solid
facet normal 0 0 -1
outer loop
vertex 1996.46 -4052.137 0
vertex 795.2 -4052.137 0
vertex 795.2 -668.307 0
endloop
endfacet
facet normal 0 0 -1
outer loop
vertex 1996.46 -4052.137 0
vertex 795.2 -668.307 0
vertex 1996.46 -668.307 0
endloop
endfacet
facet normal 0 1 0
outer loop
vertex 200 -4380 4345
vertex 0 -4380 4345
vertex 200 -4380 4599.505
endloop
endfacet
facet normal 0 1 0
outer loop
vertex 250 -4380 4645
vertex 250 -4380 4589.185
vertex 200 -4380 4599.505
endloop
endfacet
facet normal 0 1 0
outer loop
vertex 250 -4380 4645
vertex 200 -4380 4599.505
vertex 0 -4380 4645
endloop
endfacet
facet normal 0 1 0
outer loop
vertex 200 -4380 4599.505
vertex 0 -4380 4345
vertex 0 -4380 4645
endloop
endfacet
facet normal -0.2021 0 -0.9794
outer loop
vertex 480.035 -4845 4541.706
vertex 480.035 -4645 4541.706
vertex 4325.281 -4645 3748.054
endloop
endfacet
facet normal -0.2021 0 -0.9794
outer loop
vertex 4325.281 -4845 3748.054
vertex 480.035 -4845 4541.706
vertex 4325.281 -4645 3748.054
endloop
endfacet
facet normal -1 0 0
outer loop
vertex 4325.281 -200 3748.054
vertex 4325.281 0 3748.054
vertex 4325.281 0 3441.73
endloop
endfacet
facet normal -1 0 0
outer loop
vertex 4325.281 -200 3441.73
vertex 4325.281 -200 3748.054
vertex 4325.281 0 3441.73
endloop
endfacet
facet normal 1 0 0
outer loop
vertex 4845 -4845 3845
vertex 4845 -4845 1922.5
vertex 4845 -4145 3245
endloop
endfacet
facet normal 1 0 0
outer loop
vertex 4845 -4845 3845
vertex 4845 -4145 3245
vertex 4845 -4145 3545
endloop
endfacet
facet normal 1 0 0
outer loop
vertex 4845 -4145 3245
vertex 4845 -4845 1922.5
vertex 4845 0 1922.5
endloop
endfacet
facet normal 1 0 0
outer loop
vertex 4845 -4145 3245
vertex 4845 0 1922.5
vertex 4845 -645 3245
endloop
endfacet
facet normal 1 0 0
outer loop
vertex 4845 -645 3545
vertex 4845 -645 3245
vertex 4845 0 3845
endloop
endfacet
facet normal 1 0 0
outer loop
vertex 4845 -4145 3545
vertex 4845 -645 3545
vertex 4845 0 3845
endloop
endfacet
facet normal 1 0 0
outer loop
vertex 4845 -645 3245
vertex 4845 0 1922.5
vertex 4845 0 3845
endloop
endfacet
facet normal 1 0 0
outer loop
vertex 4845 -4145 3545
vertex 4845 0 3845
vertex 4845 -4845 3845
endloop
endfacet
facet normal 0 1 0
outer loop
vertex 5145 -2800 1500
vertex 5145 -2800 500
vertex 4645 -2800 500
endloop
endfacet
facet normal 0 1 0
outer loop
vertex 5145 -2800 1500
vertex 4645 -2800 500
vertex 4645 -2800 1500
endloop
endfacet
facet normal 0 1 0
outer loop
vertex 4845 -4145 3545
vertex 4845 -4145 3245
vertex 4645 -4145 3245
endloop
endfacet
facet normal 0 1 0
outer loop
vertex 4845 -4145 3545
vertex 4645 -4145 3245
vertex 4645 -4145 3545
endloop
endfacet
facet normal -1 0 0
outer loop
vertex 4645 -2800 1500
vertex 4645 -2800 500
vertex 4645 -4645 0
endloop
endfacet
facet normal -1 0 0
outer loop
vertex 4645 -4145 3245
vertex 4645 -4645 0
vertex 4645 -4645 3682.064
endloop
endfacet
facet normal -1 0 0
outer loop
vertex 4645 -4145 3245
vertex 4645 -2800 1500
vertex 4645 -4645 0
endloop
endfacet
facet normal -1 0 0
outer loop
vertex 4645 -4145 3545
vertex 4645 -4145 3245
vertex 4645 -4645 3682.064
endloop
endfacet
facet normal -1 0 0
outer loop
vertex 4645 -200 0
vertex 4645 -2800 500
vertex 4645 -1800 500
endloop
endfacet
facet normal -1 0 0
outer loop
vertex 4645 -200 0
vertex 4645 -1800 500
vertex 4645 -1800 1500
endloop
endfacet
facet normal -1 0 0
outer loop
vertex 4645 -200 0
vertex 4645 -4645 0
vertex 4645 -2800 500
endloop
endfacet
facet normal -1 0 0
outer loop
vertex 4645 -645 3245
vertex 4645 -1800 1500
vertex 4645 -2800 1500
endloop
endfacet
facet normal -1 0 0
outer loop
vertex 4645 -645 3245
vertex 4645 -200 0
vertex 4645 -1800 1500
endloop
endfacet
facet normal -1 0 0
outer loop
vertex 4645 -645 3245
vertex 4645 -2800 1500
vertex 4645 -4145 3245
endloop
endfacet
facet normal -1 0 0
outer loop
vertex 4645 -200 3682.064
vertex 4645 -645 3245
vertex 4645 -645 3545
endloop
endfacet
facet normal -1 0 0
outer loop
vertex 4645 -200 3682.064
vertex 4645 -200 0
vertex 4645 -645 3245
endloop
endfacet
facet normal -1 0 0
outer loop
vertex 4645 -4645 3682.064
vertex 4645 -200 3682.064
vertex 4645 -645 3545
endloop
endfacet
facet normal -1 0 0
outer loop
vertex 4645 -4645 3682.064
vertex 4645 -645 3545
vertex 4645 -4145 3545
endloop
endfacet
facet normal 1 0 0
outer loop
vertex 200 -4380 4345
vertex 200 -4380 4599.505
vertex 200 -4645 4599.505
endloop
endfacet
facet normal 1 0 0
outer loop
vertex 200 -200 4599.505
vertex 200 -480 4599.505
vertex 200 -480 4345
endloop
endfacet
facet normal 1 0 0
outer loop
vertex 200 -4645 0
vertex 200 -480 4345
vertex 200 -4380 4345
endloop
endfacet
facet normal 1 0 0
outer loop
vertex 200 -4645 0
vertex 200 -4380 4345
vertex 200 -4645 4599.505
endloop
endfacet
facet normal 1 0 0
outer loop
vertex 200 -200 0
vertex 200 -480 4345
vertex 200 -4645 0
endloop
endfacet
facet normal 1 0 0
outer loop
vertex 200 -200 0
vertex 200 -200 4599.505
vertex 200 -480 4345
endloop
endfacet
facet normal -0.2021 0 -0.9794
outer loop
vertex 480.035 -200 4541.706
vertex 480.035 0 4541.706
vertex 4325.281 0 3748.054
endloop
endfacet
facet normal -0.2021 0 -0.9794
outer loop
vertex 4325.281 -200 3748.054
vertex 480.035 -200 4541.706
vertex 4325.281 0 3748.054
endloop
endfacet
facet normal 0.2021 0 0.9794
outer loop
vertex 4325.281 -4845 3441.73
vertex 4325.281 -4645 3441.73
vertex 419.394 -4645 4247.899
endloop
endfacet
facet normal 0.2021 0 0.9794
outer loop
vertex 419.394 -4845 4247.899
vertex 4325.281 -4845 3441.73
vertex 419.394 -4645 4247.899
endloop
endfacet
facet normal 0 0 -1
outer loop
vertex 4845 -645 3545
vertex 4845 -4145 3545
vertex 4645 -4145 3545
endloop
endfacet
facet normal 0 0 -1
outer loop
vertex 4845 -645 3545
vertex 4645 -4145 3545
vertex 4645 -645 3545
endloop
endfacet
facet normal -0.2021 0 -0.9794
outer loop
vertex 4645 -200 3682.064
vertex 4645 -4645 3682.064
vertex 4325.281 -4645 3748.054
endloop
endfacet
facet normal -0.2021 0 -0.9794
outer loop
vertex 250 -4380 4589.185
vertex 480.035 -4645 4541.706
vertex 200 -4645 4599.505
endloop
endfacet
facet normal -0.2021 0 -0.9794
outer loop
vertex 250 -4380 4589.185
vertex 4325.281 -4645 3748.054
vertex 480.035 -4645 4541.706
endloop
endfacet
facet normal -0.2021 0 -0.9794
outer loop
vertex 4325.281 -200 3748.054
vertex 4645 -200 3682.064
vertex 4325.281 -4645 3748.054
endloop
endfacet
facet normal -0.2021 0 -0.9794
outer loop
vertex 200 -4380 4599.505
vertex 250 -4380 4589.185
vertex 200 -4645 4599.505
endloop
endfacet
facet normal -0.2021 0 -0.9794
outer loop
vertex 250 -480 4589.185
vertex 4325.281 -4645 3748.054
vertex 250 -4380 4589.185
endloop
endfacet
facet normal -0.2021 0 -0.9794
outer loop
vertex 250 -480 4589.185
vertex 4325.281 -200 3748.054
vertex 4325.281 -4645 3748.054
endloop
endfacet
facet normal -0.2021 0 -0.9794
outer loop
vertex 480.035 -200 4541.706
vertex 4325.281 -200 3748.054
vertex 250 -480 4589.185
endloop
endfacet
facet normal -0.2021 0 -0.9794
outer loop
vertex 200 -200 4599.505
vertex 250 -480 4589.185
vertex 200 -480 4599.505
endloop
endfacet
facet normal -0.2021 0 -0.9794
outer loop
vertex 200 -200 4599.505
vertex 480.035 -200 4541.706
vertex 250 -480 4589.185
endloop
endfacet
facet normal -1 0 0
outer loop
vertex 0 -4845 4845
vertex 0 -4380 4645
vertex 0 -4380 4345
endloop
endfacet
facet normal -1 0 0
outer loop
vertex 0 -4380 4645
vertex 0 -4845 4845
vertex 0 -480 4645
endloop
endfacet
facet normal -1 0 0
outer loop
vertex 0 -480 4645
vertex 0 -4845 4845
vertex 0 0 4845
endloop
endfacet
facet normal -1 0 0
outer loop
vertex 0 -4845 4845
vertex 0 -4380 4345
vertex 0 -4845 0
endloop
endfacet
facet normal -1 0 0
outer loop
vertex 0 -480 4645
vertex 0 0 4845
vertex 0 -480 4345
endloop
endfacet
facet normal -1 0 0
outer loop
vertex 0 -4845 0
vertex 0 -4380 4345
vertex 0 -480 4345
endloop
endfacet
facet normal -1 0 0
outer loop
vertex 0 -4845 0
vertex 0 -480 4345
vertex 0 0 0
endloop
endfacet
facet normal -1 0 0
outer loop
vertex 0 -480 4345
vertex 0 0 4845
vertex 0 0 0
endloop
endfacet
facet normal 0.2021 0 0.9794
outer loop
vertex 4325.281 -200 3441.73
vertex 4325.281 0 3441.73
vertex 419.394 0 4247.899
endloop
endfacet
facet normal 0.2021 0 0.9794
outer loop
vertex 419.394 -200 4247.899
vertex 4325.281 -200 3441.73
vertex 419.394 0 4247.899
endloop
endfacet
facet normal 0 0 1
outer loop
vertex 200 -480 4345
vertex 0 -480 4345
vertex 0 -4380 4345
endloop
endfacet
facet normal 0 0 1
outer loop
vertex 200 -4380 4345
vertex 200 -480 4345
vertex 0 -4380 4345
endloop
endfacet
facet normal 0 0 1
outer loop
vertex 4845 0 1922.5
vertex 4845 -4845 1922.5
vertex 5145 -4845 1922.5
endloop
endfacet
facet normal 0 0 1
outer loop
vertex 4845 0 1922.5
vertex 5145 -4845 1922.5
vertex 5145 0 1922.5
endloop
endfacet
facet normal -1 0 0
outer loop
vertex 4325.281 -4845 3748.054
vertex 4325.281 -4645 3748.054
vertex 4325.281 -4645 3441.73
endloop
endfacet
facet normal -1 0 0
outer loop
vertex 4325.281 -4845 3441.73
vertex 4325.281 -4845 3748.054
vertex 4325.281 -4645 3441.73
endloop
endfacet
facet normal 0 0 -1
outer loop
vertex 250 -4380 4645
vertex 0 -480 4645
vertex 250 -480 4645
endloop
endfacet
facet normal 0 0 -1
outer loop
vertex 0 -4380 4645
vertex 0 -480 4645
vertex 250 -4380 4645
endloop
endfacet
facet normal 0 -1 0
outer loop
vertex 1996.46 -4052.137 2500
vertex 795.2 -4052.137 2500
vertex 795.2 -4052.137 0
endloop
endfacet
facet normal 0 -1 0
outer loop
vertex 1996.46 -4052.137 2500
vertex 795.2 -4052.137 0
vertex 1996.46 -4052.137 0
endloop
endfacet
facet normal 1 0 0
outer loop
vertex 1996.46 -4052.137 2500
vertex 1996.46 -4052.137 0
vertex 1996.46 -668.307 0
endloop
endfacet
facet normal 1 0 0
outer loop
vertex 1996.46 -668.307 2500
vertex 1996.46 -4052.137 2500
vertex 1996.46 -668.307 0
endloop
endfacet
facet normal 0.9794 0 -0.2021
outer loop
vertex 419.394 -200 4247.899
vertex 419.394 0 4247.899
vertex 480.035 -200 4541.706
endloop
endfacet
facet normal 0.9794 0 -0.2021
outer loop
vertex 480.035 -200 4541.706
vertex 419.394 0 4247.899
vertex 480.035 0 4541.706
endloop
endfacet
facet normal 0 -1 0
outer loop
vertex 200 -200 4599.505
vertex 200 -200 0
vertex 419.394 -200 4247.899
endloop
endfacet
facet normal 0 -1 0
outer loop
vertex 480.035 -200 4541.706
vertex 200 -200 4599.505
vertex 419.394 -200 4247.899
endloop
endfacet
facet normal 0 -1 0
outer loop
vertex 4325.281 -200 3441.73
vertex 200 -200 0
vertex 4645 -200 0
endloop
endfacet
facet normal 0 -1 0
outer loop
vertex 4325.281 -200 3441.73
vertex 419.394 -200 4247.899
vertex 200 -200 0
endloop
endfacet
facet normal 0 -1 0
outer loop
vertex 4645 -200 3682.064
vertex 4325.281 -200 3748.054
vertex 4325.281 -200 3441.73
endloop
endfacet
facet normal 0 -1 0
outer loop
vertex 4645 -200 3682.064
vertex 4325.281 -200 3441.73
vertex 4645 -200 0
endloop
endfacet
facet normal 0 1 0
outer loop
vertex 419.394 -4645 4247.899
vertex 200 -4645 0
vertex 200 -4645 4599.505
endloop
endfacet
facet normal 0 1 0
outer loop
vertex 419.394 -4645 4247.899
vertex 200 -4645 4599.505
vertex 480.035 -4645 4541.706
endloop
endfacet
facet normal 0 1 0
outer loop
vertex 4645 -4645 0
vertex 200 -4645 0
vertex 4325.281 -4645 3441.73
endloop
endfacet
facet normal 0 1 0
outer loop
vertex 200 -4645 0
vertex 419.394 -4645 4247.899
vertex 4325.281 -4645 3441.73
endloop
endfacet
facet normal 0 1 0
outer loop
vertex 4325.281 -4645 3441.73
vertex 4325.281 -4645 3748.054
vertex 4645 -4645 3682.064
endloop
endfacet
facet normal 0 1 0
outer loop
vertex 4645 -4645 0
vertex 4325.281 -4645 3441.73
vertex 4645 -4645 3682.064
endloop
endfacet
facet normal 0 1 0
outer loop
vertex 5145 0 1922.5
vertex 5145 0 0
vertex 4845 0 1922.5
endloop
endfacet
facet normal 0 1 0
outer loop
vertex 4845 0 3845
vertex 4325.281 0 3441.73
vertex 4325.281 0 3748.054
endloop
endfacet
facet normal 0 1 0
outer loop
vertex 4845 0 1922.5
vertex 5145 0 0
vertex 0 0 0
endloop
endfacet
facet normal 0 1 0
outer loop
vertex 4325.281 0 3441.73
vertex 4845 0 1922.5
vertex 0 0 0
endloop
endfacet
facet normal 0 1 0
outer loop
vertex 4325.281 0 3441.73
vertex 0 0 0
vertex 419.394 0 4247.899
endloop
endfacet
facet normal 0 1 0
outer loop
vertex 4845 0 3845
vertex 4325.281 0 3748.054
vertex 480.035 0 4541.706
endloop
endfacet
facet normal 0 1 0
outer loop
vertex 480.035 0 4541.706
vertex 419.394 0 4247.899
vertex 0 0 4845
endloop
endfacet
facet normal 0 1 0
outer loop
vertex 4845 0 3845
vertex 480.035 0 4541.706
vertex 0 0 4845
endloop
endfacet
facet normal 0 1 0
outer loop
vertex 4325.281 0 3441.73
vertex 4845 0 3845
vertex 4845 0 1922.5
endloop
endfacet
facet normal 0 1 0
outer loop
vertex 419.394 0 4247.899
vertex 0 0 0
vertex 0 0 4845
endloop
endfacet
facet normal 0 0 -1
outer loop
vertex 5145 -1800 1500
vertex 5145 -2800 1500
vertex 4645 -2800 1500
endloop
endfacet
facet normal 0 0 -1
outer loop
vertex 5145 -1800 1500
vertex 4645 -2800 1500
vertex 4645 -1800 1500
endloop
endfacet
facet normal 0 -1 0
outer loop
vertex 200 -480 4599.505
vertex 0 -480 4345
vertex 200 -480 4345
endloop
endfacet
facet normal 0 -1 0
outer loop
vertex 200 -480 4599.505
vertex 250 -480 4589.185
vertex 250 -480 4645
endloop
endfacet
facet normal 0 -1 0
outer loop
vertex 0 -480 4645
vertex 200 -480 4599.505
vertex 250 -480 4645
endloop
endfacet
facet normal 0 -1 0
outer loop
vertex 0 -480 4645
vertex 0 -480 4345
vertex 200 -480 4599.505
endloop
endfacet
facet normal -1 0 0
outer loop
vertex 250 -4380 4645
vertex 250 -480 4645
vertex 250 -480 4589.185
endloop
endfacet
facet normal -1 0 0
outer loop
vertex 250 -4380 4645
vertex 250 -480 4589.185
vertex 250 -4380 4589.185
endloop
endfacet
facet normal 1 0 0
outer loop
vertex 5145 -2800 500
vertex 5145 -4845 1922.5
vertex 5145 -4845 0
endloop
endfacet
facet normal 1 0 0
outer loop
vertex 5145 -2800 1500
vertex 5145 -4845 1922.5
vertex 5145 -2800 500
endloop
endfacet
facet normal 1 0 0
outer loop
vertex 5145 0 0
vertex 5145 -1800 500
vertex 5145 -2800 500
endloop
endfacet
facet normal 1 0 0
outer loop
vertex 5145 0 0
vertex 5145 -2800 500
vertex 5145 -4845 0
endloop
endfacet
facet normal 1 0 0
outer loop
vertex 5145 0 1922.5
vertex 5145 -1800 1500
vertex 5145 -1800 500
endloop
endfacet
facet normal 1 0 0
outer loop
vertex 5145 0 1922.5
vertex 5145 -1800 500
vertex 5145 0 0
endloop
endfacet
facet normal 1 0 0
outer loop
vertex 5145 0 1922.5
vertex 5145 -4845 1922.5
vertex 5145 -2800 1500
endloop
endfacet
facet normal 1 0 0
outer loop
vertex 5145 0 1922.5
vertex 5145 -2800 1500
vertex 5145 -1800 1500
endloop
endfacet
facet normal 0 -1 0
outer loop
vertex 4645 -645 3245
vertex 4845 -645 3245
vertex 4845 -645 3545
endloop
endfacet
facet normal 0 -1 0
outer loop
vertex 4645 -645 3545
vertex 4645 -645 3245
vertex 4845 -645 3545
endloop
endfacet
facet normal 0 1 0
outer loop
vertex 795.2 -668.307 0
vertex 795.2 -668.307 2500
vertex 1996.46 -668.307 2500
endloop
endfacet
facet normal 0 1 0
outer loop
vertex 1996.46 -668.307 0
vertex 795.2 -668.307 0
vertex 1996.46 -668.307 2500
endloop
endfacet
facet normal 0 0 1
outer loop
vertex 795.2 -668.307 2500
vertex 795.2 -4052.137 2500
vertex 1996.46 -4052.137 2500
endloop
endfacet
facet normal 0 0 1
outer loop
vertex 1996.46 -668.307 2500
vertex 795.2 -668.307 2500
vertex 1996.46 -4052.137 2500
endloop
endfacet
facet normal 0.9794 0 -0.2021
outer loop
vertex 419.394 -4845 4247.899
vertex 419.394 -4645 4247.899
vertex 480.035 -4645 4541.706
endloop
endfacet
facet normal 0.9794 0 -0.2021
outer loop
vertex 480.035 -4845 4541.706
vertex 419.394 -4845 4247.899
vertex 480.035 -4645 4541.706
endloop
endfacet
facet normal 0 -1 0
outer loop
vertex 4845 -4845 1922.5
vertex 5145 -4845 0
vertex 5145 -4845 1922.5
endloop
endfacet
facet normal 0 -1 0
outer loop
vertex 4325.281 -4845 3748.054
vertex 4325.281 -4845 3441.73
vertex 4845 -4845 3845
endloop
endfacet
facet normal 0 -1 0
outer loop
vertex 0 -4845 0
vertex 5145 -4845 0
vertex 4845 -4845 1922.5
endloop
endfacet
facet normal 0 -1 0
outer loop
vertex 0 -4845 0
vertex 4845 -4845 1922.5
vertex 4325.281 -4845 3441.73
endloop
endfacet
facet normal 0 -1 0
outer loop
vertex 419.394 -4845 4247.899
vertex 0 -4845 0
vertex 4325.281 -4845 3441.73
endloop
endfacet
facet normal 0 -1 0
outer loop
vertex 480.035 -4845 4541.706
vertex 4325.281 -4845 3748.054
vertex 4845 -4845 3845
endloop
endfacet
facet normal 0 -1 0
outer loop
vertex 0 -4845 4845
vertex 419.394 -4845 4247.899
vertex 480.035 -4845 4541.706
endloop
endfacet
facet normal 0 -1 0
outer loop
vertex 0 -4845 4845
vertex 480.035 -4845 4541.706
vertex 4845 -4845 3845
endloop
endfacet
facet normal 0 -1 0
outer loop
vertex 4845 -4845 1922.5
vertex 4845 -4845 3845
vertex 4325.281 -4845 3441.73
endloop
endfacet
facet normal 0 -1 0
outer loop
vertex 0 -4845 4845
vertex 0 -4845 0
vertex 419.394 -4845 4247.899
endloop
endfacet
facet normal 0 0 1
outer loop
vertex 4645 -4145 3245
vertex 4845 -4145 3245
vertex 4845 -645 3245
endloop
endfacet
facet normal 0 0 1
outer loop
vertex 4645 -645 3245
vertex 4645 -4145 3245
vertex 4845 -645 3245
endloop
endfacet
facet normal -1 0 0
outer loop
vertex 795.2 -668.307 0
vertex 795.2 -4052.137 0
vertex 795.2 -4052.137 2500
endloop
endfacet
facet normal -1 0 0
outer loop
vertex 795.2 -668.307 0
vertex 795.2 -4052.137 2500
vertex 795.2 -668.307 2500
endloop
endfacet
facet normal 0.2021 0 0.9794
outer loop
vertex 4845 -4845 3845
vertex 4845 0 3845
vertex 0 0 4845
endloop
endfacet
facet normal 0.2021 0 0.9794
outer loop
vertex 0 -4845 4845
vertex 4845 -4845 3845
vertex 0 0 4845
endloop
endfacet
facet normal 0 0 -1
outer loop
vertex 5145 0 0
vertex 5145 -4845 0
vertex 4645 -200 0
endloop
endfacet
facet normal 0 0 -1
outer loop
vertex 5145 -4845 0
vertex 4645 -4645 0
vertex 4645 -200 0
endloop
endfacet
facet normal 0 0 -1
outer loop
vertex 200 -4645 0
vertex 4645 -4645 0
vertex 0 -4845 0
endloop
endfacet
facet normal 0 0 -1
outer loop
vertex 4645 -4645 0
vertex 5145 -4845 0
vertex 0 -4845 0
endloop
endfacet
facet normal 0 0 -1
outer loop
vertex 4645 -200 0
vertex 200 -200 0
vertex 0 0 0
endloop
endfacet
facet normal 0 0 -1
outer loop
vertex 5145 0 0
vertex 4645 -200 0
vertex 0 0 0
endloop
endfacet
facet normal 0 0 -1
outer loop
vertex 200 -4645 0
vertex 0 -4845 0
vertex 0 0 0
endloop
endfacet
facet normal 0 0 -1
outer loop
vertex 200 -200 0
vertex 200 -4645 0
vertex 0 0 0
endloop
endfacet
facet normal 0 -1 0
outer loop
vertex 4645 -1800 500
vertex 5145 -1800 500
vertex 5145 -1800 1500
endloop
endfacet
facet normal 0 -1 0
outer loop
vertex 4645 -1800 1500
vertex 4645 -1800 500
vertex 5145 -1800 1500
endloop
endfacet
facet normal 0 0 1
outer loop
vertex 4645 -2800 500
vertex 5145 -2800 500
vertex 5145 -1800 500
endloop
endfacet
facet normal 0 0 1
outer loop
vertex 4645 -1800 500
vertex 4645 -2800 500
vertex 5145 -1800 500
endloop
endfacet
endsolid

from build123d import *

# Parameters (mm, degrees)
F1_DEPTH  = 4845
F2_T      = -200
F4_DEPTH  = 4845.001
F5_W      = 3900
F5_H      = 300
F6_DEPTH  = 250
F7_W      = 4845
F7_H      = 1922.5
F8_DEPTH  = 300
F9_W      = 1000
F9_H      = 1000
F10_DEPTH = 500
F11_W     = 3500
F11_H     = 300
F12_DEPTH = 350
F13_W     = 1201.259792
F13_H     = 3383.830309
F14_DEPTH = 2500


with BuildPart() as f1:
    # F0 (on Front) → F1 (new body)
    with BuildSketch(Plane.XZ):
        Polygon((0, 4845), (0, 0), (4845, 0), (4845, 3845), align=None)
    extrude(amount=F1_DEPTH)

    # F2
    f2_openings = [f1.faces().sort_by_distance(p)[0] for p in [
        (2422.5, -2422.5, 0),
    ]]
    offset(amount=F2_T, openings=f2_openings)

    # F3 (on face) → F4 (cut, through all)
    with BuildSketch(Plane(origin=(0, 0, 0), x_dir=(-1, 0, 0), z_dir=(0, 1, 0))):
        Polygon((-480.034919, 4541.705986), (-4325.280602, 3748.053626), (-4325.280602, 3441.730226), (-419.393611, 4247.898852), align=None)
    extrude(amount=-F4_DEPTH, mode=Mode.SUBTRACT)

    # F5 (on face) → F6 (cut)
    with BuildSketch(Plane(origin=(0, 0, 0), x_dir=(0, -1, 0), z_dir=(-1, 0, 0))):
        with Locations((2430, 4495)):
            Rectangle(F5_W, F5_H)
    extrude(amount=-F6_DEPTH, mode=Mode.SUBTRACT)

    # F7 (on face) → F8 (join)
    with BuildSketch(Plane.YZ.offset(4845)):
        with Locations((-2422.5, 961.25)):
            Rectangle(F7_W, F7_H)
    extrude(amount=F8_DEPTH)

    # F9 (on face) → F10 (cut)
    with BuildSketch(Plane.YZ.offset(5145)):
        with Locations((-2300, 1000)):
            Rectangle(F9_W, F9_H)
    extrude(amount=-F10_DEPTH, mode=Mode.SUBTRACT)

    # F11 (on face) → F12 (cut)
    with BuildSketch(Plane.YZ.offset(4845)):
        with Locations((-2395, 3395)):
            Rectangle(F11_W, F11_H)
    extrude(amount=-F12_DEPTH, mode=Mode.SUBTRACT)


with BuildPart() as f14:
    # F13 (on Top) → F14 (new body)
    with BuildSketch(Plane.XY):
        with Locations((1395.830184, -2360.221743)):
            Rectangle(F13_W, F13_H)
    extrude(amount=F14_DEPTH)


solid = Compound([f1.part, f14.part])
